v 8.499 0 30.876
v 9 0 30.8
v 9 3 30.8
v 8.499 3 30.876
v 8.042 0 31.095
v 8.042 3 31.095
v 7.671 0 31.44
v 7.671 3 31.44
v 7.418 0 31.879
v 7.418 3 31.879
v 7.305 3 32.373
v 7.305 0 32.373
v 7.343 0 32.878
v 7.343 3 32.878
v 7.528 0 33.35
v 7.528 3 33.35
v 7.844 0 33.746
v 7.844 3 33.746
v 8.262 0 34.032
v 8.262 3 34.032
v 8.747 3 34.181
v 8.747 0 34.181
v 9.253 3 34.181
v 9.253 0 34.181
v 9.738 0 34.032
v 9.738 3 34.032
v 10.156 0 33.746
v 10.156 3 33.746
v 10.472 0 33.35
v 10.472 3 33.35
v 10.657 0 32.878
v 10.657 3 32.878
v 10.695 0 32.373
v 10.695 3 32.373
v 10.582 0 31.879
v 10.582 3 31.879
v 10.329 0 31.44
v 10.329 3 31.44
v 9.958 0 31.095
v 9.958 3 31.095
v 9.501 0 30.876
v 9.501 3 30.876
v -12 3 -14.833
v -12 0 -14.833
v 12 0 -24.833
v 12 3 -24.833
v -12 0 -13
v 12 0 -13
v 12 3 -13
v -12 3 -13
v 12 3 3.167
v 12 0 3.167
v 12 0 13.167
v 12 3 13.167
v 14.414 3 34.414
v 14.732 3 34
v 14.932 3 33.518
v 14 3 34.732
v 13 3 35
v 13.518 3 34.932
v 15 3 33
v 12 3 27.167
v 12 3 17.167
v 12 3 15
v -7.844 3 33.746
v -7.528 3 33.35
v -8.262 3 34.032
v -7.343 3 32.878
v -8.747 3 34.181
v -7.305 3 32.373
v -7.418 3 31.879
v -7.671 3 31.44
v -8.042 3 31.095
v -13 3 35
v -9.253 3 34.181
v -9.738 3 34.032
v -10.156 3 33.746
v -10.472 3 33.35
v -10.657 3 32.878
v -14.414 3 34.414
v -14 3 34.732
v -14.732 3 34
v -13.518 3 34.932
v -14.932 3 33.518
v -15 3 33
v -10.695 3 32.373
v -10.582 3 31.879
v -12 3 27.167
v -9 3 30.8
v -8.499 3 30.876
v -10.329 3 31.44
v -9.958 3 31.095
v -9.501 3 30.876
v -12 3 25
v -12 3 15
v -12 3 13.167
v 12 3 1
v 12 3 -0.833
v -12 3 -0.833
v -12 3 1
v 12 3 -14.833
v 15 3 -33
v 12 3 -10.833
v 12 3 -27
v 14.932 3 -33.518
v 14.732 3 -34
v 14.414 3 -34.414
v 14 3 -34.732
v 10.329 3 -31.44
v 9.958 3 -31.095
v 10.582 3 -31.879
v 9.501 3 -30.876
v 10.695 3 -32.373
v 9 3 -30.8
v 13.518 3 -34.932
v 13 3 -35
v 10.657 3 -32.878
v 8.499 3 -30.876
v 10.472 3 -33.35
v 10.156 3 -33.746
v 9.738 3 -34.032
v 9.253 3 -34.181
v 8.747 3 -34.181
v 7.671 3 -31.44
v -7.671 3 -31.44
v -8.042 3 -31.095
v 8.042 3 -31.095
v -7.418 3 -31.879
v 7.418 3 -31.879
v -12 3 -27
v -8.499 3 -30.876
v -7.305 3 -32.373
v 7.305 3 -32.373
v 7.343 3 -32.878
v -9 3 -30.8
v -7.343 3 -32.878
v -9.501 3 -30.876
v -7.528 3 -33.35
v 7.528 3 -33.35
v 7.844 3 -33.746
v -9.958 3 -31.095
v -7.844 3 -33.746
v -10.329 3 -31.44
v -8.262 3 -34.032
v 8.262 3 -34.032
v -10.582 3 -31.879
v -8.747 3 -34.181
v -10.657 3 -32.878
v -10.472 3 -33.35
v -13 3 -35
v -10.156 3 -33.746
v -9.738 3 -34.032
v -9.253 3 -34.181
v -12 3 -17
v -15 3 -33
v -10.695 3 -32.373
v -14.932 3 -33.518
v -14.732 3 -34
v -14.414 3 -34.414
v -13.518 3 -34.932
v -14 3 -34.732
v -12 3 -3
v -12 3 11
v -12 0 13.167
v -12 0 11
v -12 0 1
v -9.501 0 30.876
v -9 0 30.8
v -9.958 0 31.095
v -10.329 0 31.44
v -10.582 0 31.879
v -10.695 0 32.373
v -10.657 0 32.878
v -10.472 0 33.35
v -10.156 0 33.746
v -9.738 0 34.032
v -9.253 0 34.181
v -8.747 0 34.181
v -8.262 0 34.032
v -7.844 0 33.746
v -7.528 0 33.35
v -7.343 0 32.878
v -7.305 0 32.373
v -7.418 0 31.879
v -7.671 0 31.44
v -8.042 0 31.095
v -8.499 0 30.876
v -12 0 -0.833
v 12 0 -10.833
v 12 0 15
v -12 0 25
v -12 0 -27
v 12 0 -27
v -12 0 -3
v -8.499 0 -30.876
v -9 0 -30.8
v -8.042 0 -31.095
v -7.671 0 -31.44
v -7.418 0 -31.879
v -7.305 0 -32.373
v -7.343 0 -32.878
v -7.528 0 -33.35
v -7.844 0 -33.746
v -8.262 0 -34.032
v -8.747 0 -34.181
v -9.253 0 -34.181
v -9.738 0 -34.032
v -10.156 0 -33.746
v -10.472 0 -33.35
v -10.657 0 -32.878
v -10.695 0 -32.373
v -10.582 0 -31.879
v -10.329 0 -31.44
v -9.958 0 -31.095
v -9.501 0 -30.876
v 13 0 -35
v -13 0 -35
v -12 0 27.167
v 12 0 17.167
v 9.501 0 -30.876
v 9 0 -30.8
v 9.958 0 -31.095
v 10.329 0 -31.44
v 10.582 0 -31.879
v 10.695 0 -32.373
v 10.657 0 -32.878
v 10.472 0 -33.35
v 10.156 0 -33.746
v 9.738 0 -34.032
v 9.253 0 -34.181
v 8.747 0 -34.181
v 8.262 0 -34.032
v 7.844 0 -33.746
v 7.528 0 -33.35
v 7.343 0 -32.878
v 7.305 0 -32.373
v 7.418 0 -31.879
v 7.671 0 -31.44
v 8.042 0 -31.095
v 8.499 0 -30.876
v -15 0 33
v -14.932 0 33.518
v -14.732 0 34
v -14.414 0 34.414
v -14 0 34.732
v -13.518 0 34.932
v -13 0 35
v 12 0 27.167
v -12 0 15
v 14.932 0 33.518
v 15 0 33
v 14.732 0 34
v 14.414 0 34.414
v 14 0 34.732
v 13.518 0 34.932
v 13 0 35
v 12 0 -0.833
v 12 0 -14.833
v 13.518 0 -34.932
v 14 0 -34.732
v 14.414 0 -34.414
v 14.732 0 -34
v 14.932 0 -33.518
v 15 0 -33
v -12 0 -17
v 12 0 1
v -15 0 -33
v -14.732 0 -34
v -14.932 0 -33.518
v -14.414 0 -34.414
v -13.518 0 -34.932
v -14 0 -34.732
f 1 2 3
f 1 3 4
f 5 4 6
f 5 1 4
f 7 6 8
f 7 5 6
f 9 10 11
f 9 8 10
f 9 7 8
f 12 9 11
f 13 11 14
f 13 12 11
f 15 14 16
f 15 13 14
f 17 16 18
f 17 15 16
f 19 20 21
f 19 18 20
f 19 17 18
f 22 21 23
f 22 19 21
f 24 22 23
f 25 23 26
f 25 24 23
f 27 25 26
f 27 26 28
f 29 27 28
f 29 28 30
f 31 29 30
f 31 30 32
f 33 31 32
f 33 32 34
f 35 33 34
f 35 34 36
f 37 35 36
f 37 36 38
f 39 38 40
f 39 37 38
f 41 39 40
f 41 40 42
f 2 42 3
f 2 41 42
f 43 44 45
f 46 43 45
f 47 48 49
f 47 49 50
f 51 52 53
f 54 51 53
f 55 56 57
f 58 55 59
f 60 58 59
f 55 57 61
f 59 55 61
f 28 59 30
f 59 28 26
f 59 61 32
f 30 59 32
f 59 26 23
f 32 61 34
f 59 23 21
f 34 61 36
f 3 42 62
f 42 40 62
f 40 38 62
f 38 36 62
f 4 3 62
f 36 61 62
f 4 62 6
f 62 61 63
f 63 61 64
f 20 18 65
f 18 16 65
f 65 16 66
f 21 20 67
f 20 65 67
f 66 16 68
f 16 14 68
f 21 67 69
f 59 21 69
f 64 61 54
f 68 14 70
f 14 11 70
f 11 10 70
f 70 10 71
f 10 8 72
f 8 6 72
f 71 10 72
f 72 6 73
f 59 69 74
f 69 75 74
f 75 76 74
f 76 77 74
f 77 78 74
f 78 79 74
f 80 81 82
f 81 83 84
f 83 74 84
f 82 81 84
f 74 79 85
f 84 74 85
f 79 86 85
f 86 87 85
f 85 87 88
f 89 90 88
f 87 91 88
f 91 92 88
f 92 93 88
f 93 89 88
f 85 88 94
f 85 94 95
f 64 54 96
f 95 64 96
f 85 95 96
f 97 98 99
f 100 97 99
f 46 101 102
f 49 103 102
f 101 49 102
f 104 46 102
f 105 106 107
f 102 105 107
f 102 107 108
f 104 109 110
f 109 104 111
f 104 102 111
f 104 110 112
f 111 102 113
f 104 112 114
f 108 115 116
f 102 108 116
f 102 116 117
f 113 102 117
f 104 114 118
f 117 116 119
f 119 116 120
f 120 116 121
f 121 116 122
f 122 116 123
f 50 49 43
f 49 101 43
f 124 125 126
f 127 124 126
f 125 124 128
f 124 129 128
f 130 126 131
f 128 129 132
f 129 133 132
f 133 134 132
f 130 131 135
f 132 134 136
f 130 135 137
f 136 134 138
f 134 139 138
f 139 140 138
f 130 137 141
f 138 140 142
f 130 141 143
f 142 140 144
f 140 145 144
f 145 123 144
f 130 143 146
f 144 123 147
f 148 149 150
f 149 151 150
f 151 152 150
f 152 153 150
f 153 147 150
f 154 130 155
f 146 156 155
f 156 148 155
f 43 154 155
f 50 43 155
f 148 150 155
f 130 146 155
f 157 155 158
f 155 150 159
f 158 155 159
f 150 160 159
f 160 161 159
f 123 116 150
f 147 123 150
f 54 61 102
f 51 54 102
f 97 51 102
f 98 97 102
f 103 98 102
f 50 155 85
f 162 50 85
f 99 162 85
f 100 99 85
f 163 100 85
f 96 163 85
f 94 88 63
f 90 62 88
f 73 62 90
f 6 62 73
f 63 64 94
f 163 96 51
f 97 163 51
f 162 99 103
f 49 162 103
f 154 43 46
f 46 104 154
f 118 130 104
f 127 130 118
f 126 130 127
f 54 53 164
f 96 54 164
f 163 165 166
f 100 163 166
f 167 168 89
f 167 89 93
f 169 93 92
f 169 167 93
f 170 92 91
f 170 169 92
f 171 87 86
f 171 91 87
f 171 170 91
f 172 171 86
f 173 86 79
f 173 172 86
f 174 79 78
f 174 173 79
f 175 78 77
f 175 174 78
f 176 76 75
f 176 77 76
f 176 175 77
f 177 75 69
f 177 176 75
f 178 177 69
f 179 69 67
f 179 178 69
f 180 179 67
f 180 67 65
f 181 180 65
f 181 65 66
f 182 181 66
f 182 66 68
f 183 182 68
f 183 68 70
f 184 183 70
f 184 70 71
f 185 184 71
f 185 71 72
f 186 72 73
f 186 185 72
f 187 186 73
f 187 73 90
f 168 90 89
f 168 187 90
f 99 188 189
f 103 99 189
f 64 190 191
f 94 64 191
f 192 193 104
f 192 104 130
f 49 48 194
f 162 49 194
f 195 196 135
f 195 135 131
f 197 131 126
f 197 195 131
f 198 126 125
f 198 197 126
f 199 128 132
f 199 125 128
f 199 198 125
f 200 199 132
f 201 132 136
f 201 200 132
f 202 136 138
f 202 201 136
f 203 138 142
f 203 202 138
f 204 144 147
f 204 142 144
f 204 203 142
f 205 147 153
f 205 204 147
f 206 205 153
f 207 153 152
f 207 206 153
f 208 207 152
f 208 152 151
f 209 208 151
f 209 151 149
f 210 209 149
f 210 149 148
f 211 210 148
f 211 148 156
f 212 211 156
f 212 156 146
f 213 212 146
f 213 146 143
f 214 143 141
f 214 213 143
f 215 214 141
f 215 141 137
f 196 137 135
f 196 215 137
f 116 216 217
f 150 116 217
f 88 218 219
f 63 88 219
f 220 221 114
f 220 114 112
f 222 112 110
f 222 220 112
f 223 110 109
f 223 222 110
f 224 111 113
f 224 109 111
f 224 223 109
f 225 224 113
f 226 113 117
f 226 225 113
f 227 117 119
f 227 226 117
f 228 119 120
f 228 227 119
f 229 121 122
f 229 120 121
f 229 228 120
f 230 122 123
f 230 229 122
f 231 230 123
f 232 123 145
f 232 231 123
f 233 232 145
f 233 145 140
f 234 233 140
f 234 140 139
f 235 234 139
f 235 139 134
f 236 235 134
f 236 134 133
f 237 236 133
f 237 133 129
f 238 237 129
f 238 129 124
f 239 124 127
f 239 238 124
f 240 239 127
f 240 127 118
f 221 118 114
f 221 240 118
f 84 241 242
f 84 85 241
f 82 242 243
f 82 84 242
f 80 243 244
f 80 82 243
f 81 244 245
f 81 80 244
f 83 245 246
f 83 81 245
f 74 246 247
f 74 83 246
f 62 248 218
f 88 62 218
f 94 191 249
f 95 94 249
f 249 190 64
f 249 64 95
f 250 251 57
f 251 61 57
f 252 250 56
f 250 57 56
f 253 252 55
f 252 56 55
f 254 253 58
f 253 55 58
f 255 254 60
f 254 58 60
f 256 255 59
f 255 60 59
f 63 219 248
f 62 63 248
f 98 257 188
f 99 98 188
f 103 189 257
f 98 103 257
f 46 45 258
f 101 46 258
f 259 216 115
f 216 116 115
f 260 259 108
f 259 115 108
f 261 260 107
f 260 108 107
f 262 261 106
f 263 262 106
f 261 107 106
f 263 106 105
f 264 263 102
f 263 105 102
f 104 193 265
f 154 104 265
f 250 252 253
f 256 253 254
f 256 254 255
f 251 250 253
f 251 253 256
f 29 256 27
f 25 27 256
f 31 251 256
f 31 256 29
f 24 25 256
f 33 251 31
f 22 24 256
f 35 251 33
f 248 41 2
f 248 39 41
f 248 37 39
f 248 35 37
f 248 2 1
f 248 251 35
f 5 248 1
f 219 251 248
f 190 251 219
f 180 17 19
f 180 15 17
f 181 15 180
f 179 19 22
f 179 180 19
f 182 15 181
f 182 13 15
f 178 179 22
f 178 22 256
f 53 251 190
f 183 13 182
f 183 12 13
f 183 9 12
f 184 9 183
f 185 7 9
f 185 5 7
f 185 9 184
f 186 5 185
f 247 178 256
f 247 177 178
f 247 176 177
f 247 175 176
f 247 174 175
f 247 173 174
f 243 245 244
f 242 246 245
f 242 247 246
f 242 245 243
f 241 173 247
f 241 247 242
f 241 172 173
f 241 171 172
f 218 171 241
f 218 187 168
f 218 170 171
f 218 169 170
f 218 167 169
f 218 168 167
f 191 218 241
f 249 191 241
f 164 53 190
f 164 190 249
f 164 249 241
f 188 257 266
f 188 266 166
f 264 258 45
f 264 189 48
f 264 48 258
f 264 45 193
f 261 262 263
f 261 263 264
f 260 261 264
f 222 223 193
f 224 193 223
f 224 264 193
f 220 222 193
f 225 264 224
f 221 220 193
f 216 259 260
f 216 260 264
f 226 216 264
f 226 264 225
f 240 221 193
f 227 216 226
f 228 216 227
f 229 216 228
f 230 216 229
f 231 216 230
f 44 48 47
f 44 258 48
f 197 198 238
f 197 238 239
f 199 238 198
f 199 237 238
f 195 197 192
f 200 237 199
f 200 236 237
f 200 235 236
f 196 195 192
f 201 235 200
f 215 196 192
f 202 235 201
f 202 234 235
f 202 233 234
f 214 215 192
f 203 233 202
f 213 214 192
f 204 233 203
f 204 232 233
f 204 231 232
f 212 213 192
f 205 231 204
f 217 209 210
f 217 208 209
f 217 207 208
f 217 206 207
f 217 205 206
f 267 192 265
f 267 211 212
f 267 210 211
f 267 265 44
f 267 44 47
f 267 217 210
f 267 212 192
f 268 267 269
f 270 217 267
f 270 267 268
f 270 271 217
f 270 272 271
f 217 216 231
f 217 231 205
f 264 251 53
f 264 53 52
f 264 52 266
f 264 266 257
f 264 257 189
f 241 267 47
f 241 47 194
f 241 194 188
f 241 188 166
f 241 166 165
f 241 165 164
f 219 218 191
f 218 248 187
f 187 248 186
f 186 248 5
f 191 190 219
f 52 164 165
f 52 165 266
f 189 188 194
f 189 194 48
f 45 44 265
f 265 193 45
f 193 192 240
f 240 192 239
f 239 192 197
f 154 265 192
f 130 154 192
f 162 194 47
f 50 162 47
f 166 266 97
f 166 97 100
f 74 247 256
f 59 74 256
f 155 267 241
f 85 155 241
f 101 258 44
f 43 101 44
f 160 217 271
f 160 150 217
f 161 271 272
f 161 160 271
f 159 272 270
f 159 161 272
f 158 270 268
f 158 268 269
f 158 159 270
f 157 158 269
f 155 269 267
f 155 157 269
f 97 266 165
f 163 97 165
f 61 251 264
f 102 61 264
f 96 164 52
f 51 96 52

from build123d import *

# Parameters (mm, degrees)
BOSS_EXTRUDE1_DEPTH     = 3
CUT_EXTRUDE1_DEPTH      = 39.19685851
CUT_EXTRUDE1_DEPTH_BACK = 39.19685851
SKETCH2_R               = 1.7
CUT_EXTRUDE2_DEPTH      = 39.19685851
CUT_EXTRUDE2_DEPTH_BACK = 39.19685851
FILLET1_R               = 2


with BuildPart() as part:
    # Sketch1 → Boss-Extrude1 (new body)
    with BuildSketch(Plane(origin=(0, 0, 0), x_dir=(1, 0, 0), z_dir=(0, 1, 0))):
        Polygon((-15, 35), (0, 35), (15, 35), (15, 0), (15, -35), (0, -35), (-15, -35), (-15, 0), align=None)
    extrude(amount=BOSS_EXTRUDE1_DEPTH)

    # Sketch2 → Cut-Extrude1 (cut, two sides: drawn at the far end of the back side and taken through both)
    with BuildSketch(Plane(origin=(0, 3, 0), x_dir=(1, 0, 0), z_dir=(0, 1, 0)).offset(-CUT_EXTRUDE1_DEPTH_BACK)):
        with Locations(Location((-9, 32.5, 0), (0, 0, 270))):
            Circle(SKETCH2_R)
        with Locations(Location((9, 32.5, 0), (0, 0, 270))):
            Circle(SKETCH2_R)
        with Locations(Location((9, -32.5, 0), (0, 0, 90))):
            Circle(SKETCH2_R)
        with Locations(Location((-9, -32.5, 0), (0, 0, 90))):
            Circle(SKETCH2_R)
    extrude(amount=CUT_EXTRUDE1_DEPTH + CUT_EXTRUDE1_DEPTH_BACK, mode=Mode.SUBTRACT)

    # Sketch3 → Cut-Extrude2 (cut, two sides: drawn at the far end of the back side and taken through both)
    with BuildSketch(Plane(origin=(0, 3, 0), x_dir=(1, 0, 0), z_dir=(0, 1, 0)).offset(-CUT_EXTRUDE2_DEPTH_BACK)):
        Polygon((-12, 27), (0, 27), (12, 27), (-12, 17), align=None)
        Polygon((-12, 14.833333333), (12, 24.833333333), (12, 14.833333333), align=None)
        Polygon((-12, 13), (0, 13), (12, 13), (-12, 3), align=None)
        Polygon((-12, 0.833333333), (12, 10.833333333), (12, 0.833333333), align=None)
        Polygon((-12, -1), (0, -1), (12, -1), (-12, -11), align=None)
        Polygon((-12, -13.166666667), (12, -3.166666667), (12, -13.166666667), align=None)
        Polygon((-12, -15), (0, -15), (12, -15), (-12, -25), align=None)
        Polygon((-12, -27.166666667), (12, -17.166666667), (12, -27.166666667), align=None)
    extrude(amount=CUT_EXTRUDE2_DEPTH + CUT_EXTRUDE2_DEPTH_BACK, mode=Mode.SUBTRACT)

    # Fillet1
    fillet1_edges = [part.edges().sort_by_distance(p)[0] for p in [
        (-15, 1.5, -35),
        (15, 1.5, -35),
        (15, 1.5, 35),
        (-15, 1.5, 35),
    ]]
    fillet(fillet1_edges, radius=FILLET1_R)


solid = part.part
